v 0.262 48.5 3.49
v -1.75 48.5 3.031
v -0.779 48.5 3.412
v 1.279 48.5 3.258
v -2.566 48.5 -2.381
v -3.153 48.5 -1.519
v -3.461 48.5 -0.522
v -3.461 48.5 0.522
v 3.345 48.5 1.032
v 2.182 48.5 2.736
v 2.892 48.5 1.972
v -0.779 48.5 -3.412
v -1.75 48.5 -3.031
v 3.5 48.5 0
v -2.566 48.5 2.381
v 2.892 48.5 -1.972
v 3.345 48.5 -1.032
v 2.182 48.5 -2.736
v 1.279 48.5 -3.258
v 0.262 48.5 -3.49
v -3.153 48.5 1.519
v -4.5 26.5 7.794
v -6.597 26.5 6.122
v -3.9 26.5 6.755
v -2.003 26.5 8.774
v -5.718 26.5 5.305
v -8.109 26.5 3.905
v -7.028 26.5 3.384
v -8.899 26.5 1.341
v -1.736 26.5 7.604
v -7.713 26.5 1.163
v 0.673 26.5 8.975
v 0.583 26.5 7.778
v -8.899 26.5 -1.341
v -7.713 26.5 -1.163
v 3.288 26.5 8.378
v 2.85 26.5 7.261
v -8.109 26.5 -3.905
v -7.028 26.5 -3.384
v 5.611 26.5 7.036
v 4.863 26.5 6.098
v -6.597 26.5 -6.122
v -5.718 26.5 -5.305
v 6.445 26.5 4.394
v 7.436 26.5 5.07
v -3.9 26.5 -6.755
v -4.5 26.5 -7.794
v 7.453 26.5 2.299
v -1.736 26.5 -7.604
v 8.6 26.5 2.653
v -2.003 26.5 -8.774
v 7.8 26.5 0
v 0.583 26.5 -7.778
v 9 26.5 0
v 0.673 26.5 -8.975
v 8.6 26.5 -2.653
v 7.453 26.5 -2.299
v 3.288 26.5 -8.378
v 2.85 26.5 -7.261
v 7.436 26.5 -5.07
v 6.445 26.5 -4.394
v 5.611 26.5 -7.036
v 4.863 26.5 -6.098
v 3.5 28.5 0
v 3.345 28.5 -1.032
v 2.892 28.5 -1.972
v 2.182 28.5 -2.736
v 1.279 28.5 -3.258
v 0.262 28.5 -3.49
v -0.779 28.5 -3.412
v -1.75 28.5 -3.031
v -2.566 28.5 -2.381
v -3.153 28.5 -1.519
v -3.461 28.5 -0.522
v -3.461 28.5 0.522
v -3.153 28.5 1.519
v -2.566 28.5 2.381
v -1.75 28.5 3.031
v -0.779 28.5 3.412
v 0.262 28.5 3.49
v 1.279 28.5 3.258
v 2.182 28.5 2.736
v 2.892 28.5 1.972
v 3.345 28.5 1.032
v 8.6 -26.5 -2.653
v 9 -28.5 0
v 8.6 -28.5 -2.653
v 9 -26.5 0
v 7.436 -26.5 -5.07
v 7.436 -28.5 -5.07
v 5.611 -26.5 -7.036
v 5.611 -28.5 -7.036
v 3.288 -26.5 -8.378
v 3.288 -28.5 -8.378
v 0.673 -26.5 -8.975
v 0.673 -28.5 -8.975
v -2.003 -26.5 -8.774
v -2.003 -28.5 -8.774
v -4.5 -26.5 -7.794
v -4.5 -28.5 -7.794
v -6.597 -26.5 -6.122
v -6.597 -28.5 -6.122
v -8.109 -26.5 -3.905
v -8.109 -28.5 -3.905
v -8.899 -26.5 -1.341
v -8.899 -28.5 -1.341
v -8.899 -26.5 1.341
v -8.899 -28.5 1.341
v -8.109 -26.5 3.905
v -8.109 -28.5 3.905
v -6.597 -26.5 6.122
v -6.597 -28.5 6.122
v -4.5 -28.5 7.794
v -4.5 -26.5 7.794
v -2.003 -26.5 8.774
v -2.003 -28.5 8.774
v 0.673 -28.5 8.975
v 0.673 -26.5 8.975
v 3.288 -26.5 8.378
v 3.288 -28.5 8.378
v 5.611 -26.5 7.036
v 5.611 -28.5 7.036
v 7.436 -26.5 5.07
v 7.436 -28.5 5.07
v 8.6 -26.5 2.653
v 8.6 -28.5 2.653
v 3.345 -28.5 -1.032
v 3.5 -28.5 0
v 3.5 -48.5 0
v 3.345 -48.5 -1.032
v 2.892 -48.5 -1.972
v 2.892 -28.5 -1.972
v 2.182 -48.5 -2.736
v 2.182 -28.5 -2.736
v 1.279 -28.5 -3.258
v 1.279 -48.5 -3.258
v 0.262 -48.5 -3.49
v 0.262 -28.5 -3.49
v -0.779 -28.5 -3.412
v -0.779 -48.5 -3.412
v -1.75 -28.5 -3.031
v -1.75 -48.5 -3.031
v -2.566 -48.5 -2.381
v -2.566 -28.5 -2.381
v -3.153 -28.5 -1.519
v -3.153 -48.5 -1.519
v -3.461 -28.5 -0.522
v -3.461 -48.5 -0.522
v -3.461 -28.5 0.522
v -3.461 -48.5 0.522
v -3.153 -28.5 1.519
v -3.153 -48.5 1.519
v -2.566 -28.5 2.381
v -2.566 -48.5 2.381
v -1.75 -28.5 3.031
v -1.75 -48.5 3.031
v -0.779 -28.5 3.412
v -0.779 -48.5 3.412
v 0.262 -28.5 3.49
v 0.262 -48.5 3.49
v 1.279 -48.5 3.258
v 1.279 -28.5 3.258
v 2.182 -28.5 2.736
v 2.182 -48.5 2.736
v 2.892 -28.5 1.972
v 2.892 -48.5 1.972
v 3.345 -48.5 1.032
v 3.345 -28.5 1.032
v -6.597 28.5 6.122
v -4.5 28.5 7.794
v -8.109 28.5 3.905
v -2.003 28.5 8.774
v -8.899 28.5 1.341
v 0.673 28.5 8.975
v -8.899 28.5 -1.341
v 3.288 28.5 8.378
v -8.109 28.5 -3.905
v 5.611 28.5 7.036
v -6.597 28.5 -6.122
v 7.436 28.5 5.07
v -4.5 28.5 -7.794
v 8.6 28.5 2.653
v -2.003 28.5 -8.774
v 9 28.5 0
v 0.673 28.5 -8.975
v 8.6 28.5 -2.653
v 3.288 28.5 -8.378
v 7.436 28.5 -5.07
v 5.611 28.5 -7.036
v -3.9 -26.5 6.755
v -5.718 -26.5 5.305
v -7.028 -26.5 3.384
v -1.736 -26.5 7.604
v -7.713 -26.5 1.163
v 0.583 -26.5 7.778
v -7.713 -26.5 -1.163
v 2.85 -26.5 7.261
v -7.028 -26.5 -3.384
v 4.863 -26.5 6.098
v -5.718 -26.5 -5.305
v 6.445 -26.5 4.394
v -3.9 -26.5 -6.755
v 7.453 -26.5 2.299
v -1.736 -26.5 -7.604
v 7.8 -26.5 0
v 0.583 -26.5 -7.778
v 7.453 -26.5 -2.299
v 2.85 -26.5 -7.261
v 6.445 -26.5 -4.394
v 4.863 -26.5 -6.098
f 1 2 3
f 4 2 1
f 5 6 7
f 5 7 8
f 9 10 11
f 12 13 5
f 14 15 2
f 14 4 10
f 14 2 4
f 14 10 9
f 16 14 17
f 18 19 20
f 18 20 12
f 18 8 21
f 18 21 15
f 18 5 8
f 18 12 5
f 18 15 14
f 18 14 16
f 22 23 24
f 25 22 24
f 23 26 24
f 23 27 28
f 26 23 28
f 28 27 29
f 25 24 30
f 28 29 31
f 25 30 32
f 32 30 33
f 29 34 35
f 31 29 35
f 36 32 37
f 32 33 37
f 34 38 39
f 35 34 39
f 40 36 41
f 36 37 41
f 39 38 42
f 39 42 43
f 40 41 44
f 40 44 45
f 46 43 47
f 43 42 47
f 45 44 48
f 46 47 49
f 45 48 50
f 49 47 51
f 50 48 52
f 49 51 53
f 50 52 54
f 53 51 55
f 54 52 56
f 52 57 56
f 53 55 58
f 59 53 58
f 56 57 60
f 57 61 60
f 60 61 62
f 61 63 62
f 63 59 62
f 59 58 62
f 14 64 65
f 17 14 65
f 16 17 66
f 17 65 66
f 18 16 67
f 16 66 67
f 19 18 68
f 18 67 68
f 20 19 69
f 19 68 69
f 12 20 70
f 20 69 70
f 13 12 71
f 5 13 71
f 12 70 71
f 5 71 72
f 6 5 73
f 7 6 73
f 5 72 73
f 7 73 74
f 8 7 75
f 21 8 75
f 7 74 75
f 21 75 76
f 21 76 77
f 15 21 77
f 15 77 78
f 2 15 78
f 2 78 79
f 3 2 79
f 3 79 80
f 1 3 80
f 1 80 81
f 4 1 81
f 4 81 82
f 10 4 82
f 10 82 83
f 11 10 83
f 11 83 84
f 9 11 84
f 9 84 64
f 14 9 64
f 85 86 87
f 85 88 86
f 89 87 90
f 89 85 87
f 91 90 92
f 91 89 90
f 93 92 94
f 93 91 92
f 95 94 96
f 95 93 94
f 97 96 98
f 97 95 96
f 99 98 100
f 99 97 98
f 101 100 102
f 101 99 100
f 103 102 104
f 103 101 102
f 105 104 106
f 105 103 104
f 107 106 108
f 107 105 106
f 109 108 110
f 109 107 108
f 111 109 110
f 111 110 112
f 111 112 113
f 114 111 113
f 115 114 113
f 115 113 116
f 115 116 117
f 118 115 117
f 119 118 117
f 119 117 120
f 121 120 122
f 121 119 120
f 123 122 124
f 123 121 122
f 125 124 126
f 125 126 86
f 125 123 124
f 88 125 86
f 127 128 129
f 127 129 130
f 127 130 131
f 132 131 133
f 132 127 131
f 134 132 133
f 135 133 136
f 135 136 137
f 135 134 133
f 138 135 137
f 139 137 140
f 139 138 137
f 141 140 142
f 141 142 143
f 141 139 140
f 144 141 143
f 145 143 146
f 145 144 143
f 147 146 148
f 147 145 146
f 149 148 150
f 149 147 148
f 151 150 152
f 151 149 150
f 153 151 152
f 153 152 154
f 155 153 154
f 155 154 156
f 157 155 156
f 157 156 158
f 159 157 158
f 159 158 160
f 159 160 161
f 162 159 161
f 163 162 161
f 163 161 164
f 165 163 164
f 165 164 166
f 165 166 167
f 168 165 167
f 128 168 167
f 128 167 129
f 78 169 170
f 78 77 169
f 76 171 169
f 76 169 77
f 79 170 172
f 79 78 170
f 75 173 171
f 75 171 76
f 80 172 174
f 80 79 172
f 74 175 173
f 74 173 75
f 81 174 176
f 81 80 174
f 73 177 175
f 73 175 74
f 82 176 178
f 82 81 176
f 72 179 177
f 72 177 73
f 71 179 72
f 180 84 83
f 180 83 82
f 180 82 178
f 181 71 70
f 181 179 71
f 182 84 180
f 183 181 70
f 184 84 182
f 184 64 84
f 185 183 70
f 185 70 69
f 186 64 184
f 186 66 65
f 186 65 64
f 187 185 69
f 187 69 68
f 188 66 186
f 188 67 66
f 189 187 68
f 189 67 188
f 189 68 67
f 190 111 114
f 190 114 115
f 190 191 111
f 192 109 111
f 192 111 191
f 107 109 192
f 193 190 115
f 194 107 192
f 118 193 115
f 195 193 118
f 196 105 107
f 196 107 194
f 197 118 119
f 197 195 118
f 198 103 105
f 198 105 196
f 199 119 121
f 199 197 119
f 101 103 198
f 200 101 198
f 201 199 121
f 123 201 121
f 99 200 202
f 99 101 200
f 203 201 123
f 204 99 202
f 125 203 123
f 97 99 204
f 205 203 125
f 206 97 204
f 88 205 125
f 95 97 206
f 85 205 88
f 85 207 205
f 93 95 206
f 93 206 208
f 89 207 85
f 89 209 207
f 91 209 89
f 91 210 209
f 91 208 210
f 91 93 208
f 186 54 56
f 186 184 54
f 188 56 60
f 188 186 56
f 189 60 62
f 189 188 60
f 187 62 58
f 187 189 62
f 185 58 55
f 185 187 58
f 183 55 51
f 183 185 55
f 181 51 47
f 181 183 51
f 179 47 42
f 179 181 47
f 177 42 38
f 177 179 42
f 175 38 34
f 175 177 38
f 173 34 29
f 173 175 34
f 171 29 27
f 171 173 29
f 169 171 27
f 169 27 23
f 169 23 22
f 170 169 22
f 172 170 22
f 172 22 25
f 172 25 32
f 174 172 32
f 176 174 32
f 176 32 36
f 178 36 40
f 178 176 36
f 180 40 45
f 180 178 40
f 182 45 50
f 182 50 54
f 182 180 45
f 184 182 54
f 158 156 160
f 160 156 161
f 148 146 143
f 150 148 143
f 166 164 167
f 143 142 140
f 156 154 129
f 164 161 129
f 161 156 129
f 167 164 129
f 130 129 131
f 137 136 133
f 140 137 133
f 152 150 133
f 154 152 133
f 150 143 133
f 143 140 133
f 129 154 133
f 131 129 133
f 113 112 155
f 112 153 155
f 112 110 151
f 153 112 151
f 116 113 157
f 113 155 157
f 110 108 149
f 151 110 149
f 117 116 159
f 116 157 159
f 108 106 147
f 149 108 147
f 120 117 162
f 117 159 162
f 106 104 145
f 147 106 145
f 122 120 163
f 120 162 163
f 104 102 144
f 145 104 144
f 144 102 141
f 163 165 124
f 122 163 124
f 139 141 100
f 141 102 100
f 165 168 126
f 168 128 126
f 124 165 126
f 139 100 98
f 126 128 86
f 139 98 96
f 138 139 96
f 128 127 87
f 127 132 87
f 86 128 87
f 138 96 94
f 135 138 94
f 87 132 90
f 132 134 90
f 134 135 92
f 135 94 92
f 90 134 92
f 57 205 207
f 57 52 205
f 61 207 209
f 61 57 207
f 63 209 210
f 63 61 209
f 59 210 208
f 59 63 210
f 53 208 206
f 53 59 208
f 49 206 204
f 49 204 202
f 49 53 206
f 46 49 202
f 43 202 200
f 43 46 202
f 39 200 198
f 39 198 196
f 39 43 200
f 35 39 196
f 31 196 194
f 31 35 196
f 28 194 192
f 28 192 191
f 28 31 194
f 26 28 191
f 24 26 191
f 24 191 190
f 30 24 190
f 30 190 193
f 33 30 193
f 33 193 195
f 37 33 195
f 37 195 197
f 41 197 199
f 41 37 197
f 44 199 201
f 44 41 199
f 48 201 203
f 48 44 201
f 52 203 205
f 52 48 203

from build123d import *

# Parameters (mm, degrees)
EXTRUDE2_DEPTH          = 28.5
EXTRUDE2_DEPTH_BACK     = 28.5
SKETCH3_R               = 9
CUT_EXTRUDE2_DEPTH      = 26.5
CUT_EXTRUDE2_DEPTH_BACK = 26.5
SKETCH4_R               = 9
SKETCH4_R_2             = 7.8
EXTRUDE3_DEPTH          = 48.5
EXTRUDE3_DEPTH_BACK     = 48.5
SKETCH5_R               = 3.5


with BuildPart() as part:
    # Sketch3 → Extrude2 (new, two sides: drawn at the far end of the back side and taken through both)
    with BuildSketch(Plane(origin=(0, 0, 0), x_dir=(1, 0, 0), z_dir=(0, 1, 0)).offset(-EXTRUDE2_DEPTH_BACK)):
        Circle(SKETCH3_R)
    extrude(amount=EXTRUDE2_DEPTH + EXTRUDE2_DEPTH_BACK)

    # Sketch4 → Cut-Extrude2 (cut, two sides: drawn at the far end of the back side and taken through both)
    with BuildSketch(Plane(origin=(0, 0, 0), x_dir=(1, 0, 0), z_dir=(0, 1, 0)).offset(-CUT_EXTRUDE2_DEPTH_BACK)):
        Circle(SKETCH4_R)
        Circle(SKETCH4_R_2, mode=Mode.SUBTRACT)
    extrude(amount=CUT_EXTRUDE2_DEPTH + CUT_EXTRUDE2_DEPTH_BACK, mode=Mode.SUBTRACT)

    # Sketch5 → Extrude3 (add, two sides: drawn at the far end of the back side and taken through both)
    with BuildSketch(Plane(origin=(0, 0, 0), x_dir=(1, 0, 0), z_dir=(0, 1, 0)).offset(-EXTRUDE3_DEPTH_BACK)):
        Circle(SKETCH5_R)
    extrude(amount=EXTRUDE3_DEPTH + EXTRUDE3_DEPTH_BACK)


solid = part.part
